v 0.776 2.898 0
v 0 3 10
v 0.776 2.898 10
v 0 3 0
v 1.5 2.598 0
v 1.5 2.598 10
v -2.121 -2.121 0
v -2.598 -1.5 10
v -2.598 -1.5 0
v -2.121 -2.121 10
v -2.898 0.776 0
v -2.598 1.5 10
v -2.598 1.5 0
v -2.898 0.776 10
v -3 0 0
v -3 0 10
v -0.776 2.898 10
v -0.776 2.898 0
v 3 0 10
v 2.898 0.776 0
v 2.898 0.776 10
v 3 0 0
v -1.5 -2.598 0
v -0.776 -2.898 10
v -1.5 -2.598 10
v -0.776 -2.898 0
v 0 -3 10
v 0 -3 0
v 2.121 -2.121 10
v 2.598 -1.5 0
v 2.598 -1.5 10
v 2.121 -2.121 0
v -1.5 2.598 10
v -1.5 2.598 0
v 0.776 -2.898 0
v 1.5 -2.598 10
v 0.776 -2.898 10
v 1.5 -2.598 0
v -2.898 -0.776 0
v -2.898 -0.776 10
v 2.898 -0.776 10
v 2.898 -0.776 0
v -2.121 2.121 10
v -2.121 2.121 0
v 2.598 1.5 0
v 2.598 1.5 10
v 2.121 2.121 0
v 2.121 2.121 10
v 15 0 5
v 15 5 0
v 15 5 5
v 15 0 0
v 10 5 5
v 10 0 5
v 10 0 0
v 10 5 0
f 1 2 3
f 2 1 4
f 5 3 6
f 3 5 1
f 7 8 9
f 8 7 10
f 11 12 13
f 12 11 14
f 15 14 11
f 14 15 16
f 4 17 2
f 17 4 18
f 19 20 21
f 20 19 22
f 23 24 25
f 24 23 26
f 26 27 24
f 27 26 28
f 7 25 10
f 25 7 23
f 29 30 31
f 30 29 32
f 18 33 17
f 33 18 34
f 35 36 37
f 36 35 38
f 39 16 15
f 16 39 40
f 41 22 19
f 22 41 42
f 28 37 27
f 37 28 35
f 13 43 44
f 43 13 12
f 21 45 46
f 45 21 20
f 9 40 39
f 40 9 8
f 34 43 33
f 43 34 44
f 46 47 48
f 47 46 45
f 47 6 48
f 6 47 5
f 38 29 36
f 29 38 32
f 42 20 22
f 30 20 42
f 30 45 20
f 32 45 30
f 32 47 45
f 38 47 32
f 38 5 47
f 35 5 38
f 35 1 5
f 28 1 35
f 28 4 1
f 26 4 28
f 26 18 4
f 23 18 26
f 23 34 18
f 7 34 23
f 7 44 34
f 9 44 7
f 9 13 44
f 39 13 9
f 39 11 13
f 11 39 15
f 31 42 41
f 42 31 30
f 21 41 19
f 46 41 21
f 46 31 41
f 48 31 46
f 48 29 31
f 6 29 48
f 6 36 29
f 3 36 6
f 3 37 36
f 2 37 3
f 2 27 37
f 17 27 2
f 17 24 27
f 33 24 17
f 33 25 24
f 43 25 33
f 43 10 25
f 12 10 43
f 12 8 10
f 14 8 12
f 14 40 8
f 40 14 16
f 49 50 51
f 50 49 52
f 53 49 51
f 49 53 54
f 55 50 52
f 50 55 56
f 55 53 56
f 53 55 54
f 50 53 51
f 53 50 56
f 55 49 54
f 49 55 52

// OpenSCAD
// A colour drawn by one rotate_extrude that touches the axis: OpenSCAD keeps it
// as a PolySet whose axis triangles are degenerate, and its 3MF export fails (#952).
color("#E53935") rotate_extrude($fn = 24) polygon([[0, 0], [3, 0], [3, 10], [0, 10]]);
color("#1E88E5") translate([10, 0, 0]) cube(5);
